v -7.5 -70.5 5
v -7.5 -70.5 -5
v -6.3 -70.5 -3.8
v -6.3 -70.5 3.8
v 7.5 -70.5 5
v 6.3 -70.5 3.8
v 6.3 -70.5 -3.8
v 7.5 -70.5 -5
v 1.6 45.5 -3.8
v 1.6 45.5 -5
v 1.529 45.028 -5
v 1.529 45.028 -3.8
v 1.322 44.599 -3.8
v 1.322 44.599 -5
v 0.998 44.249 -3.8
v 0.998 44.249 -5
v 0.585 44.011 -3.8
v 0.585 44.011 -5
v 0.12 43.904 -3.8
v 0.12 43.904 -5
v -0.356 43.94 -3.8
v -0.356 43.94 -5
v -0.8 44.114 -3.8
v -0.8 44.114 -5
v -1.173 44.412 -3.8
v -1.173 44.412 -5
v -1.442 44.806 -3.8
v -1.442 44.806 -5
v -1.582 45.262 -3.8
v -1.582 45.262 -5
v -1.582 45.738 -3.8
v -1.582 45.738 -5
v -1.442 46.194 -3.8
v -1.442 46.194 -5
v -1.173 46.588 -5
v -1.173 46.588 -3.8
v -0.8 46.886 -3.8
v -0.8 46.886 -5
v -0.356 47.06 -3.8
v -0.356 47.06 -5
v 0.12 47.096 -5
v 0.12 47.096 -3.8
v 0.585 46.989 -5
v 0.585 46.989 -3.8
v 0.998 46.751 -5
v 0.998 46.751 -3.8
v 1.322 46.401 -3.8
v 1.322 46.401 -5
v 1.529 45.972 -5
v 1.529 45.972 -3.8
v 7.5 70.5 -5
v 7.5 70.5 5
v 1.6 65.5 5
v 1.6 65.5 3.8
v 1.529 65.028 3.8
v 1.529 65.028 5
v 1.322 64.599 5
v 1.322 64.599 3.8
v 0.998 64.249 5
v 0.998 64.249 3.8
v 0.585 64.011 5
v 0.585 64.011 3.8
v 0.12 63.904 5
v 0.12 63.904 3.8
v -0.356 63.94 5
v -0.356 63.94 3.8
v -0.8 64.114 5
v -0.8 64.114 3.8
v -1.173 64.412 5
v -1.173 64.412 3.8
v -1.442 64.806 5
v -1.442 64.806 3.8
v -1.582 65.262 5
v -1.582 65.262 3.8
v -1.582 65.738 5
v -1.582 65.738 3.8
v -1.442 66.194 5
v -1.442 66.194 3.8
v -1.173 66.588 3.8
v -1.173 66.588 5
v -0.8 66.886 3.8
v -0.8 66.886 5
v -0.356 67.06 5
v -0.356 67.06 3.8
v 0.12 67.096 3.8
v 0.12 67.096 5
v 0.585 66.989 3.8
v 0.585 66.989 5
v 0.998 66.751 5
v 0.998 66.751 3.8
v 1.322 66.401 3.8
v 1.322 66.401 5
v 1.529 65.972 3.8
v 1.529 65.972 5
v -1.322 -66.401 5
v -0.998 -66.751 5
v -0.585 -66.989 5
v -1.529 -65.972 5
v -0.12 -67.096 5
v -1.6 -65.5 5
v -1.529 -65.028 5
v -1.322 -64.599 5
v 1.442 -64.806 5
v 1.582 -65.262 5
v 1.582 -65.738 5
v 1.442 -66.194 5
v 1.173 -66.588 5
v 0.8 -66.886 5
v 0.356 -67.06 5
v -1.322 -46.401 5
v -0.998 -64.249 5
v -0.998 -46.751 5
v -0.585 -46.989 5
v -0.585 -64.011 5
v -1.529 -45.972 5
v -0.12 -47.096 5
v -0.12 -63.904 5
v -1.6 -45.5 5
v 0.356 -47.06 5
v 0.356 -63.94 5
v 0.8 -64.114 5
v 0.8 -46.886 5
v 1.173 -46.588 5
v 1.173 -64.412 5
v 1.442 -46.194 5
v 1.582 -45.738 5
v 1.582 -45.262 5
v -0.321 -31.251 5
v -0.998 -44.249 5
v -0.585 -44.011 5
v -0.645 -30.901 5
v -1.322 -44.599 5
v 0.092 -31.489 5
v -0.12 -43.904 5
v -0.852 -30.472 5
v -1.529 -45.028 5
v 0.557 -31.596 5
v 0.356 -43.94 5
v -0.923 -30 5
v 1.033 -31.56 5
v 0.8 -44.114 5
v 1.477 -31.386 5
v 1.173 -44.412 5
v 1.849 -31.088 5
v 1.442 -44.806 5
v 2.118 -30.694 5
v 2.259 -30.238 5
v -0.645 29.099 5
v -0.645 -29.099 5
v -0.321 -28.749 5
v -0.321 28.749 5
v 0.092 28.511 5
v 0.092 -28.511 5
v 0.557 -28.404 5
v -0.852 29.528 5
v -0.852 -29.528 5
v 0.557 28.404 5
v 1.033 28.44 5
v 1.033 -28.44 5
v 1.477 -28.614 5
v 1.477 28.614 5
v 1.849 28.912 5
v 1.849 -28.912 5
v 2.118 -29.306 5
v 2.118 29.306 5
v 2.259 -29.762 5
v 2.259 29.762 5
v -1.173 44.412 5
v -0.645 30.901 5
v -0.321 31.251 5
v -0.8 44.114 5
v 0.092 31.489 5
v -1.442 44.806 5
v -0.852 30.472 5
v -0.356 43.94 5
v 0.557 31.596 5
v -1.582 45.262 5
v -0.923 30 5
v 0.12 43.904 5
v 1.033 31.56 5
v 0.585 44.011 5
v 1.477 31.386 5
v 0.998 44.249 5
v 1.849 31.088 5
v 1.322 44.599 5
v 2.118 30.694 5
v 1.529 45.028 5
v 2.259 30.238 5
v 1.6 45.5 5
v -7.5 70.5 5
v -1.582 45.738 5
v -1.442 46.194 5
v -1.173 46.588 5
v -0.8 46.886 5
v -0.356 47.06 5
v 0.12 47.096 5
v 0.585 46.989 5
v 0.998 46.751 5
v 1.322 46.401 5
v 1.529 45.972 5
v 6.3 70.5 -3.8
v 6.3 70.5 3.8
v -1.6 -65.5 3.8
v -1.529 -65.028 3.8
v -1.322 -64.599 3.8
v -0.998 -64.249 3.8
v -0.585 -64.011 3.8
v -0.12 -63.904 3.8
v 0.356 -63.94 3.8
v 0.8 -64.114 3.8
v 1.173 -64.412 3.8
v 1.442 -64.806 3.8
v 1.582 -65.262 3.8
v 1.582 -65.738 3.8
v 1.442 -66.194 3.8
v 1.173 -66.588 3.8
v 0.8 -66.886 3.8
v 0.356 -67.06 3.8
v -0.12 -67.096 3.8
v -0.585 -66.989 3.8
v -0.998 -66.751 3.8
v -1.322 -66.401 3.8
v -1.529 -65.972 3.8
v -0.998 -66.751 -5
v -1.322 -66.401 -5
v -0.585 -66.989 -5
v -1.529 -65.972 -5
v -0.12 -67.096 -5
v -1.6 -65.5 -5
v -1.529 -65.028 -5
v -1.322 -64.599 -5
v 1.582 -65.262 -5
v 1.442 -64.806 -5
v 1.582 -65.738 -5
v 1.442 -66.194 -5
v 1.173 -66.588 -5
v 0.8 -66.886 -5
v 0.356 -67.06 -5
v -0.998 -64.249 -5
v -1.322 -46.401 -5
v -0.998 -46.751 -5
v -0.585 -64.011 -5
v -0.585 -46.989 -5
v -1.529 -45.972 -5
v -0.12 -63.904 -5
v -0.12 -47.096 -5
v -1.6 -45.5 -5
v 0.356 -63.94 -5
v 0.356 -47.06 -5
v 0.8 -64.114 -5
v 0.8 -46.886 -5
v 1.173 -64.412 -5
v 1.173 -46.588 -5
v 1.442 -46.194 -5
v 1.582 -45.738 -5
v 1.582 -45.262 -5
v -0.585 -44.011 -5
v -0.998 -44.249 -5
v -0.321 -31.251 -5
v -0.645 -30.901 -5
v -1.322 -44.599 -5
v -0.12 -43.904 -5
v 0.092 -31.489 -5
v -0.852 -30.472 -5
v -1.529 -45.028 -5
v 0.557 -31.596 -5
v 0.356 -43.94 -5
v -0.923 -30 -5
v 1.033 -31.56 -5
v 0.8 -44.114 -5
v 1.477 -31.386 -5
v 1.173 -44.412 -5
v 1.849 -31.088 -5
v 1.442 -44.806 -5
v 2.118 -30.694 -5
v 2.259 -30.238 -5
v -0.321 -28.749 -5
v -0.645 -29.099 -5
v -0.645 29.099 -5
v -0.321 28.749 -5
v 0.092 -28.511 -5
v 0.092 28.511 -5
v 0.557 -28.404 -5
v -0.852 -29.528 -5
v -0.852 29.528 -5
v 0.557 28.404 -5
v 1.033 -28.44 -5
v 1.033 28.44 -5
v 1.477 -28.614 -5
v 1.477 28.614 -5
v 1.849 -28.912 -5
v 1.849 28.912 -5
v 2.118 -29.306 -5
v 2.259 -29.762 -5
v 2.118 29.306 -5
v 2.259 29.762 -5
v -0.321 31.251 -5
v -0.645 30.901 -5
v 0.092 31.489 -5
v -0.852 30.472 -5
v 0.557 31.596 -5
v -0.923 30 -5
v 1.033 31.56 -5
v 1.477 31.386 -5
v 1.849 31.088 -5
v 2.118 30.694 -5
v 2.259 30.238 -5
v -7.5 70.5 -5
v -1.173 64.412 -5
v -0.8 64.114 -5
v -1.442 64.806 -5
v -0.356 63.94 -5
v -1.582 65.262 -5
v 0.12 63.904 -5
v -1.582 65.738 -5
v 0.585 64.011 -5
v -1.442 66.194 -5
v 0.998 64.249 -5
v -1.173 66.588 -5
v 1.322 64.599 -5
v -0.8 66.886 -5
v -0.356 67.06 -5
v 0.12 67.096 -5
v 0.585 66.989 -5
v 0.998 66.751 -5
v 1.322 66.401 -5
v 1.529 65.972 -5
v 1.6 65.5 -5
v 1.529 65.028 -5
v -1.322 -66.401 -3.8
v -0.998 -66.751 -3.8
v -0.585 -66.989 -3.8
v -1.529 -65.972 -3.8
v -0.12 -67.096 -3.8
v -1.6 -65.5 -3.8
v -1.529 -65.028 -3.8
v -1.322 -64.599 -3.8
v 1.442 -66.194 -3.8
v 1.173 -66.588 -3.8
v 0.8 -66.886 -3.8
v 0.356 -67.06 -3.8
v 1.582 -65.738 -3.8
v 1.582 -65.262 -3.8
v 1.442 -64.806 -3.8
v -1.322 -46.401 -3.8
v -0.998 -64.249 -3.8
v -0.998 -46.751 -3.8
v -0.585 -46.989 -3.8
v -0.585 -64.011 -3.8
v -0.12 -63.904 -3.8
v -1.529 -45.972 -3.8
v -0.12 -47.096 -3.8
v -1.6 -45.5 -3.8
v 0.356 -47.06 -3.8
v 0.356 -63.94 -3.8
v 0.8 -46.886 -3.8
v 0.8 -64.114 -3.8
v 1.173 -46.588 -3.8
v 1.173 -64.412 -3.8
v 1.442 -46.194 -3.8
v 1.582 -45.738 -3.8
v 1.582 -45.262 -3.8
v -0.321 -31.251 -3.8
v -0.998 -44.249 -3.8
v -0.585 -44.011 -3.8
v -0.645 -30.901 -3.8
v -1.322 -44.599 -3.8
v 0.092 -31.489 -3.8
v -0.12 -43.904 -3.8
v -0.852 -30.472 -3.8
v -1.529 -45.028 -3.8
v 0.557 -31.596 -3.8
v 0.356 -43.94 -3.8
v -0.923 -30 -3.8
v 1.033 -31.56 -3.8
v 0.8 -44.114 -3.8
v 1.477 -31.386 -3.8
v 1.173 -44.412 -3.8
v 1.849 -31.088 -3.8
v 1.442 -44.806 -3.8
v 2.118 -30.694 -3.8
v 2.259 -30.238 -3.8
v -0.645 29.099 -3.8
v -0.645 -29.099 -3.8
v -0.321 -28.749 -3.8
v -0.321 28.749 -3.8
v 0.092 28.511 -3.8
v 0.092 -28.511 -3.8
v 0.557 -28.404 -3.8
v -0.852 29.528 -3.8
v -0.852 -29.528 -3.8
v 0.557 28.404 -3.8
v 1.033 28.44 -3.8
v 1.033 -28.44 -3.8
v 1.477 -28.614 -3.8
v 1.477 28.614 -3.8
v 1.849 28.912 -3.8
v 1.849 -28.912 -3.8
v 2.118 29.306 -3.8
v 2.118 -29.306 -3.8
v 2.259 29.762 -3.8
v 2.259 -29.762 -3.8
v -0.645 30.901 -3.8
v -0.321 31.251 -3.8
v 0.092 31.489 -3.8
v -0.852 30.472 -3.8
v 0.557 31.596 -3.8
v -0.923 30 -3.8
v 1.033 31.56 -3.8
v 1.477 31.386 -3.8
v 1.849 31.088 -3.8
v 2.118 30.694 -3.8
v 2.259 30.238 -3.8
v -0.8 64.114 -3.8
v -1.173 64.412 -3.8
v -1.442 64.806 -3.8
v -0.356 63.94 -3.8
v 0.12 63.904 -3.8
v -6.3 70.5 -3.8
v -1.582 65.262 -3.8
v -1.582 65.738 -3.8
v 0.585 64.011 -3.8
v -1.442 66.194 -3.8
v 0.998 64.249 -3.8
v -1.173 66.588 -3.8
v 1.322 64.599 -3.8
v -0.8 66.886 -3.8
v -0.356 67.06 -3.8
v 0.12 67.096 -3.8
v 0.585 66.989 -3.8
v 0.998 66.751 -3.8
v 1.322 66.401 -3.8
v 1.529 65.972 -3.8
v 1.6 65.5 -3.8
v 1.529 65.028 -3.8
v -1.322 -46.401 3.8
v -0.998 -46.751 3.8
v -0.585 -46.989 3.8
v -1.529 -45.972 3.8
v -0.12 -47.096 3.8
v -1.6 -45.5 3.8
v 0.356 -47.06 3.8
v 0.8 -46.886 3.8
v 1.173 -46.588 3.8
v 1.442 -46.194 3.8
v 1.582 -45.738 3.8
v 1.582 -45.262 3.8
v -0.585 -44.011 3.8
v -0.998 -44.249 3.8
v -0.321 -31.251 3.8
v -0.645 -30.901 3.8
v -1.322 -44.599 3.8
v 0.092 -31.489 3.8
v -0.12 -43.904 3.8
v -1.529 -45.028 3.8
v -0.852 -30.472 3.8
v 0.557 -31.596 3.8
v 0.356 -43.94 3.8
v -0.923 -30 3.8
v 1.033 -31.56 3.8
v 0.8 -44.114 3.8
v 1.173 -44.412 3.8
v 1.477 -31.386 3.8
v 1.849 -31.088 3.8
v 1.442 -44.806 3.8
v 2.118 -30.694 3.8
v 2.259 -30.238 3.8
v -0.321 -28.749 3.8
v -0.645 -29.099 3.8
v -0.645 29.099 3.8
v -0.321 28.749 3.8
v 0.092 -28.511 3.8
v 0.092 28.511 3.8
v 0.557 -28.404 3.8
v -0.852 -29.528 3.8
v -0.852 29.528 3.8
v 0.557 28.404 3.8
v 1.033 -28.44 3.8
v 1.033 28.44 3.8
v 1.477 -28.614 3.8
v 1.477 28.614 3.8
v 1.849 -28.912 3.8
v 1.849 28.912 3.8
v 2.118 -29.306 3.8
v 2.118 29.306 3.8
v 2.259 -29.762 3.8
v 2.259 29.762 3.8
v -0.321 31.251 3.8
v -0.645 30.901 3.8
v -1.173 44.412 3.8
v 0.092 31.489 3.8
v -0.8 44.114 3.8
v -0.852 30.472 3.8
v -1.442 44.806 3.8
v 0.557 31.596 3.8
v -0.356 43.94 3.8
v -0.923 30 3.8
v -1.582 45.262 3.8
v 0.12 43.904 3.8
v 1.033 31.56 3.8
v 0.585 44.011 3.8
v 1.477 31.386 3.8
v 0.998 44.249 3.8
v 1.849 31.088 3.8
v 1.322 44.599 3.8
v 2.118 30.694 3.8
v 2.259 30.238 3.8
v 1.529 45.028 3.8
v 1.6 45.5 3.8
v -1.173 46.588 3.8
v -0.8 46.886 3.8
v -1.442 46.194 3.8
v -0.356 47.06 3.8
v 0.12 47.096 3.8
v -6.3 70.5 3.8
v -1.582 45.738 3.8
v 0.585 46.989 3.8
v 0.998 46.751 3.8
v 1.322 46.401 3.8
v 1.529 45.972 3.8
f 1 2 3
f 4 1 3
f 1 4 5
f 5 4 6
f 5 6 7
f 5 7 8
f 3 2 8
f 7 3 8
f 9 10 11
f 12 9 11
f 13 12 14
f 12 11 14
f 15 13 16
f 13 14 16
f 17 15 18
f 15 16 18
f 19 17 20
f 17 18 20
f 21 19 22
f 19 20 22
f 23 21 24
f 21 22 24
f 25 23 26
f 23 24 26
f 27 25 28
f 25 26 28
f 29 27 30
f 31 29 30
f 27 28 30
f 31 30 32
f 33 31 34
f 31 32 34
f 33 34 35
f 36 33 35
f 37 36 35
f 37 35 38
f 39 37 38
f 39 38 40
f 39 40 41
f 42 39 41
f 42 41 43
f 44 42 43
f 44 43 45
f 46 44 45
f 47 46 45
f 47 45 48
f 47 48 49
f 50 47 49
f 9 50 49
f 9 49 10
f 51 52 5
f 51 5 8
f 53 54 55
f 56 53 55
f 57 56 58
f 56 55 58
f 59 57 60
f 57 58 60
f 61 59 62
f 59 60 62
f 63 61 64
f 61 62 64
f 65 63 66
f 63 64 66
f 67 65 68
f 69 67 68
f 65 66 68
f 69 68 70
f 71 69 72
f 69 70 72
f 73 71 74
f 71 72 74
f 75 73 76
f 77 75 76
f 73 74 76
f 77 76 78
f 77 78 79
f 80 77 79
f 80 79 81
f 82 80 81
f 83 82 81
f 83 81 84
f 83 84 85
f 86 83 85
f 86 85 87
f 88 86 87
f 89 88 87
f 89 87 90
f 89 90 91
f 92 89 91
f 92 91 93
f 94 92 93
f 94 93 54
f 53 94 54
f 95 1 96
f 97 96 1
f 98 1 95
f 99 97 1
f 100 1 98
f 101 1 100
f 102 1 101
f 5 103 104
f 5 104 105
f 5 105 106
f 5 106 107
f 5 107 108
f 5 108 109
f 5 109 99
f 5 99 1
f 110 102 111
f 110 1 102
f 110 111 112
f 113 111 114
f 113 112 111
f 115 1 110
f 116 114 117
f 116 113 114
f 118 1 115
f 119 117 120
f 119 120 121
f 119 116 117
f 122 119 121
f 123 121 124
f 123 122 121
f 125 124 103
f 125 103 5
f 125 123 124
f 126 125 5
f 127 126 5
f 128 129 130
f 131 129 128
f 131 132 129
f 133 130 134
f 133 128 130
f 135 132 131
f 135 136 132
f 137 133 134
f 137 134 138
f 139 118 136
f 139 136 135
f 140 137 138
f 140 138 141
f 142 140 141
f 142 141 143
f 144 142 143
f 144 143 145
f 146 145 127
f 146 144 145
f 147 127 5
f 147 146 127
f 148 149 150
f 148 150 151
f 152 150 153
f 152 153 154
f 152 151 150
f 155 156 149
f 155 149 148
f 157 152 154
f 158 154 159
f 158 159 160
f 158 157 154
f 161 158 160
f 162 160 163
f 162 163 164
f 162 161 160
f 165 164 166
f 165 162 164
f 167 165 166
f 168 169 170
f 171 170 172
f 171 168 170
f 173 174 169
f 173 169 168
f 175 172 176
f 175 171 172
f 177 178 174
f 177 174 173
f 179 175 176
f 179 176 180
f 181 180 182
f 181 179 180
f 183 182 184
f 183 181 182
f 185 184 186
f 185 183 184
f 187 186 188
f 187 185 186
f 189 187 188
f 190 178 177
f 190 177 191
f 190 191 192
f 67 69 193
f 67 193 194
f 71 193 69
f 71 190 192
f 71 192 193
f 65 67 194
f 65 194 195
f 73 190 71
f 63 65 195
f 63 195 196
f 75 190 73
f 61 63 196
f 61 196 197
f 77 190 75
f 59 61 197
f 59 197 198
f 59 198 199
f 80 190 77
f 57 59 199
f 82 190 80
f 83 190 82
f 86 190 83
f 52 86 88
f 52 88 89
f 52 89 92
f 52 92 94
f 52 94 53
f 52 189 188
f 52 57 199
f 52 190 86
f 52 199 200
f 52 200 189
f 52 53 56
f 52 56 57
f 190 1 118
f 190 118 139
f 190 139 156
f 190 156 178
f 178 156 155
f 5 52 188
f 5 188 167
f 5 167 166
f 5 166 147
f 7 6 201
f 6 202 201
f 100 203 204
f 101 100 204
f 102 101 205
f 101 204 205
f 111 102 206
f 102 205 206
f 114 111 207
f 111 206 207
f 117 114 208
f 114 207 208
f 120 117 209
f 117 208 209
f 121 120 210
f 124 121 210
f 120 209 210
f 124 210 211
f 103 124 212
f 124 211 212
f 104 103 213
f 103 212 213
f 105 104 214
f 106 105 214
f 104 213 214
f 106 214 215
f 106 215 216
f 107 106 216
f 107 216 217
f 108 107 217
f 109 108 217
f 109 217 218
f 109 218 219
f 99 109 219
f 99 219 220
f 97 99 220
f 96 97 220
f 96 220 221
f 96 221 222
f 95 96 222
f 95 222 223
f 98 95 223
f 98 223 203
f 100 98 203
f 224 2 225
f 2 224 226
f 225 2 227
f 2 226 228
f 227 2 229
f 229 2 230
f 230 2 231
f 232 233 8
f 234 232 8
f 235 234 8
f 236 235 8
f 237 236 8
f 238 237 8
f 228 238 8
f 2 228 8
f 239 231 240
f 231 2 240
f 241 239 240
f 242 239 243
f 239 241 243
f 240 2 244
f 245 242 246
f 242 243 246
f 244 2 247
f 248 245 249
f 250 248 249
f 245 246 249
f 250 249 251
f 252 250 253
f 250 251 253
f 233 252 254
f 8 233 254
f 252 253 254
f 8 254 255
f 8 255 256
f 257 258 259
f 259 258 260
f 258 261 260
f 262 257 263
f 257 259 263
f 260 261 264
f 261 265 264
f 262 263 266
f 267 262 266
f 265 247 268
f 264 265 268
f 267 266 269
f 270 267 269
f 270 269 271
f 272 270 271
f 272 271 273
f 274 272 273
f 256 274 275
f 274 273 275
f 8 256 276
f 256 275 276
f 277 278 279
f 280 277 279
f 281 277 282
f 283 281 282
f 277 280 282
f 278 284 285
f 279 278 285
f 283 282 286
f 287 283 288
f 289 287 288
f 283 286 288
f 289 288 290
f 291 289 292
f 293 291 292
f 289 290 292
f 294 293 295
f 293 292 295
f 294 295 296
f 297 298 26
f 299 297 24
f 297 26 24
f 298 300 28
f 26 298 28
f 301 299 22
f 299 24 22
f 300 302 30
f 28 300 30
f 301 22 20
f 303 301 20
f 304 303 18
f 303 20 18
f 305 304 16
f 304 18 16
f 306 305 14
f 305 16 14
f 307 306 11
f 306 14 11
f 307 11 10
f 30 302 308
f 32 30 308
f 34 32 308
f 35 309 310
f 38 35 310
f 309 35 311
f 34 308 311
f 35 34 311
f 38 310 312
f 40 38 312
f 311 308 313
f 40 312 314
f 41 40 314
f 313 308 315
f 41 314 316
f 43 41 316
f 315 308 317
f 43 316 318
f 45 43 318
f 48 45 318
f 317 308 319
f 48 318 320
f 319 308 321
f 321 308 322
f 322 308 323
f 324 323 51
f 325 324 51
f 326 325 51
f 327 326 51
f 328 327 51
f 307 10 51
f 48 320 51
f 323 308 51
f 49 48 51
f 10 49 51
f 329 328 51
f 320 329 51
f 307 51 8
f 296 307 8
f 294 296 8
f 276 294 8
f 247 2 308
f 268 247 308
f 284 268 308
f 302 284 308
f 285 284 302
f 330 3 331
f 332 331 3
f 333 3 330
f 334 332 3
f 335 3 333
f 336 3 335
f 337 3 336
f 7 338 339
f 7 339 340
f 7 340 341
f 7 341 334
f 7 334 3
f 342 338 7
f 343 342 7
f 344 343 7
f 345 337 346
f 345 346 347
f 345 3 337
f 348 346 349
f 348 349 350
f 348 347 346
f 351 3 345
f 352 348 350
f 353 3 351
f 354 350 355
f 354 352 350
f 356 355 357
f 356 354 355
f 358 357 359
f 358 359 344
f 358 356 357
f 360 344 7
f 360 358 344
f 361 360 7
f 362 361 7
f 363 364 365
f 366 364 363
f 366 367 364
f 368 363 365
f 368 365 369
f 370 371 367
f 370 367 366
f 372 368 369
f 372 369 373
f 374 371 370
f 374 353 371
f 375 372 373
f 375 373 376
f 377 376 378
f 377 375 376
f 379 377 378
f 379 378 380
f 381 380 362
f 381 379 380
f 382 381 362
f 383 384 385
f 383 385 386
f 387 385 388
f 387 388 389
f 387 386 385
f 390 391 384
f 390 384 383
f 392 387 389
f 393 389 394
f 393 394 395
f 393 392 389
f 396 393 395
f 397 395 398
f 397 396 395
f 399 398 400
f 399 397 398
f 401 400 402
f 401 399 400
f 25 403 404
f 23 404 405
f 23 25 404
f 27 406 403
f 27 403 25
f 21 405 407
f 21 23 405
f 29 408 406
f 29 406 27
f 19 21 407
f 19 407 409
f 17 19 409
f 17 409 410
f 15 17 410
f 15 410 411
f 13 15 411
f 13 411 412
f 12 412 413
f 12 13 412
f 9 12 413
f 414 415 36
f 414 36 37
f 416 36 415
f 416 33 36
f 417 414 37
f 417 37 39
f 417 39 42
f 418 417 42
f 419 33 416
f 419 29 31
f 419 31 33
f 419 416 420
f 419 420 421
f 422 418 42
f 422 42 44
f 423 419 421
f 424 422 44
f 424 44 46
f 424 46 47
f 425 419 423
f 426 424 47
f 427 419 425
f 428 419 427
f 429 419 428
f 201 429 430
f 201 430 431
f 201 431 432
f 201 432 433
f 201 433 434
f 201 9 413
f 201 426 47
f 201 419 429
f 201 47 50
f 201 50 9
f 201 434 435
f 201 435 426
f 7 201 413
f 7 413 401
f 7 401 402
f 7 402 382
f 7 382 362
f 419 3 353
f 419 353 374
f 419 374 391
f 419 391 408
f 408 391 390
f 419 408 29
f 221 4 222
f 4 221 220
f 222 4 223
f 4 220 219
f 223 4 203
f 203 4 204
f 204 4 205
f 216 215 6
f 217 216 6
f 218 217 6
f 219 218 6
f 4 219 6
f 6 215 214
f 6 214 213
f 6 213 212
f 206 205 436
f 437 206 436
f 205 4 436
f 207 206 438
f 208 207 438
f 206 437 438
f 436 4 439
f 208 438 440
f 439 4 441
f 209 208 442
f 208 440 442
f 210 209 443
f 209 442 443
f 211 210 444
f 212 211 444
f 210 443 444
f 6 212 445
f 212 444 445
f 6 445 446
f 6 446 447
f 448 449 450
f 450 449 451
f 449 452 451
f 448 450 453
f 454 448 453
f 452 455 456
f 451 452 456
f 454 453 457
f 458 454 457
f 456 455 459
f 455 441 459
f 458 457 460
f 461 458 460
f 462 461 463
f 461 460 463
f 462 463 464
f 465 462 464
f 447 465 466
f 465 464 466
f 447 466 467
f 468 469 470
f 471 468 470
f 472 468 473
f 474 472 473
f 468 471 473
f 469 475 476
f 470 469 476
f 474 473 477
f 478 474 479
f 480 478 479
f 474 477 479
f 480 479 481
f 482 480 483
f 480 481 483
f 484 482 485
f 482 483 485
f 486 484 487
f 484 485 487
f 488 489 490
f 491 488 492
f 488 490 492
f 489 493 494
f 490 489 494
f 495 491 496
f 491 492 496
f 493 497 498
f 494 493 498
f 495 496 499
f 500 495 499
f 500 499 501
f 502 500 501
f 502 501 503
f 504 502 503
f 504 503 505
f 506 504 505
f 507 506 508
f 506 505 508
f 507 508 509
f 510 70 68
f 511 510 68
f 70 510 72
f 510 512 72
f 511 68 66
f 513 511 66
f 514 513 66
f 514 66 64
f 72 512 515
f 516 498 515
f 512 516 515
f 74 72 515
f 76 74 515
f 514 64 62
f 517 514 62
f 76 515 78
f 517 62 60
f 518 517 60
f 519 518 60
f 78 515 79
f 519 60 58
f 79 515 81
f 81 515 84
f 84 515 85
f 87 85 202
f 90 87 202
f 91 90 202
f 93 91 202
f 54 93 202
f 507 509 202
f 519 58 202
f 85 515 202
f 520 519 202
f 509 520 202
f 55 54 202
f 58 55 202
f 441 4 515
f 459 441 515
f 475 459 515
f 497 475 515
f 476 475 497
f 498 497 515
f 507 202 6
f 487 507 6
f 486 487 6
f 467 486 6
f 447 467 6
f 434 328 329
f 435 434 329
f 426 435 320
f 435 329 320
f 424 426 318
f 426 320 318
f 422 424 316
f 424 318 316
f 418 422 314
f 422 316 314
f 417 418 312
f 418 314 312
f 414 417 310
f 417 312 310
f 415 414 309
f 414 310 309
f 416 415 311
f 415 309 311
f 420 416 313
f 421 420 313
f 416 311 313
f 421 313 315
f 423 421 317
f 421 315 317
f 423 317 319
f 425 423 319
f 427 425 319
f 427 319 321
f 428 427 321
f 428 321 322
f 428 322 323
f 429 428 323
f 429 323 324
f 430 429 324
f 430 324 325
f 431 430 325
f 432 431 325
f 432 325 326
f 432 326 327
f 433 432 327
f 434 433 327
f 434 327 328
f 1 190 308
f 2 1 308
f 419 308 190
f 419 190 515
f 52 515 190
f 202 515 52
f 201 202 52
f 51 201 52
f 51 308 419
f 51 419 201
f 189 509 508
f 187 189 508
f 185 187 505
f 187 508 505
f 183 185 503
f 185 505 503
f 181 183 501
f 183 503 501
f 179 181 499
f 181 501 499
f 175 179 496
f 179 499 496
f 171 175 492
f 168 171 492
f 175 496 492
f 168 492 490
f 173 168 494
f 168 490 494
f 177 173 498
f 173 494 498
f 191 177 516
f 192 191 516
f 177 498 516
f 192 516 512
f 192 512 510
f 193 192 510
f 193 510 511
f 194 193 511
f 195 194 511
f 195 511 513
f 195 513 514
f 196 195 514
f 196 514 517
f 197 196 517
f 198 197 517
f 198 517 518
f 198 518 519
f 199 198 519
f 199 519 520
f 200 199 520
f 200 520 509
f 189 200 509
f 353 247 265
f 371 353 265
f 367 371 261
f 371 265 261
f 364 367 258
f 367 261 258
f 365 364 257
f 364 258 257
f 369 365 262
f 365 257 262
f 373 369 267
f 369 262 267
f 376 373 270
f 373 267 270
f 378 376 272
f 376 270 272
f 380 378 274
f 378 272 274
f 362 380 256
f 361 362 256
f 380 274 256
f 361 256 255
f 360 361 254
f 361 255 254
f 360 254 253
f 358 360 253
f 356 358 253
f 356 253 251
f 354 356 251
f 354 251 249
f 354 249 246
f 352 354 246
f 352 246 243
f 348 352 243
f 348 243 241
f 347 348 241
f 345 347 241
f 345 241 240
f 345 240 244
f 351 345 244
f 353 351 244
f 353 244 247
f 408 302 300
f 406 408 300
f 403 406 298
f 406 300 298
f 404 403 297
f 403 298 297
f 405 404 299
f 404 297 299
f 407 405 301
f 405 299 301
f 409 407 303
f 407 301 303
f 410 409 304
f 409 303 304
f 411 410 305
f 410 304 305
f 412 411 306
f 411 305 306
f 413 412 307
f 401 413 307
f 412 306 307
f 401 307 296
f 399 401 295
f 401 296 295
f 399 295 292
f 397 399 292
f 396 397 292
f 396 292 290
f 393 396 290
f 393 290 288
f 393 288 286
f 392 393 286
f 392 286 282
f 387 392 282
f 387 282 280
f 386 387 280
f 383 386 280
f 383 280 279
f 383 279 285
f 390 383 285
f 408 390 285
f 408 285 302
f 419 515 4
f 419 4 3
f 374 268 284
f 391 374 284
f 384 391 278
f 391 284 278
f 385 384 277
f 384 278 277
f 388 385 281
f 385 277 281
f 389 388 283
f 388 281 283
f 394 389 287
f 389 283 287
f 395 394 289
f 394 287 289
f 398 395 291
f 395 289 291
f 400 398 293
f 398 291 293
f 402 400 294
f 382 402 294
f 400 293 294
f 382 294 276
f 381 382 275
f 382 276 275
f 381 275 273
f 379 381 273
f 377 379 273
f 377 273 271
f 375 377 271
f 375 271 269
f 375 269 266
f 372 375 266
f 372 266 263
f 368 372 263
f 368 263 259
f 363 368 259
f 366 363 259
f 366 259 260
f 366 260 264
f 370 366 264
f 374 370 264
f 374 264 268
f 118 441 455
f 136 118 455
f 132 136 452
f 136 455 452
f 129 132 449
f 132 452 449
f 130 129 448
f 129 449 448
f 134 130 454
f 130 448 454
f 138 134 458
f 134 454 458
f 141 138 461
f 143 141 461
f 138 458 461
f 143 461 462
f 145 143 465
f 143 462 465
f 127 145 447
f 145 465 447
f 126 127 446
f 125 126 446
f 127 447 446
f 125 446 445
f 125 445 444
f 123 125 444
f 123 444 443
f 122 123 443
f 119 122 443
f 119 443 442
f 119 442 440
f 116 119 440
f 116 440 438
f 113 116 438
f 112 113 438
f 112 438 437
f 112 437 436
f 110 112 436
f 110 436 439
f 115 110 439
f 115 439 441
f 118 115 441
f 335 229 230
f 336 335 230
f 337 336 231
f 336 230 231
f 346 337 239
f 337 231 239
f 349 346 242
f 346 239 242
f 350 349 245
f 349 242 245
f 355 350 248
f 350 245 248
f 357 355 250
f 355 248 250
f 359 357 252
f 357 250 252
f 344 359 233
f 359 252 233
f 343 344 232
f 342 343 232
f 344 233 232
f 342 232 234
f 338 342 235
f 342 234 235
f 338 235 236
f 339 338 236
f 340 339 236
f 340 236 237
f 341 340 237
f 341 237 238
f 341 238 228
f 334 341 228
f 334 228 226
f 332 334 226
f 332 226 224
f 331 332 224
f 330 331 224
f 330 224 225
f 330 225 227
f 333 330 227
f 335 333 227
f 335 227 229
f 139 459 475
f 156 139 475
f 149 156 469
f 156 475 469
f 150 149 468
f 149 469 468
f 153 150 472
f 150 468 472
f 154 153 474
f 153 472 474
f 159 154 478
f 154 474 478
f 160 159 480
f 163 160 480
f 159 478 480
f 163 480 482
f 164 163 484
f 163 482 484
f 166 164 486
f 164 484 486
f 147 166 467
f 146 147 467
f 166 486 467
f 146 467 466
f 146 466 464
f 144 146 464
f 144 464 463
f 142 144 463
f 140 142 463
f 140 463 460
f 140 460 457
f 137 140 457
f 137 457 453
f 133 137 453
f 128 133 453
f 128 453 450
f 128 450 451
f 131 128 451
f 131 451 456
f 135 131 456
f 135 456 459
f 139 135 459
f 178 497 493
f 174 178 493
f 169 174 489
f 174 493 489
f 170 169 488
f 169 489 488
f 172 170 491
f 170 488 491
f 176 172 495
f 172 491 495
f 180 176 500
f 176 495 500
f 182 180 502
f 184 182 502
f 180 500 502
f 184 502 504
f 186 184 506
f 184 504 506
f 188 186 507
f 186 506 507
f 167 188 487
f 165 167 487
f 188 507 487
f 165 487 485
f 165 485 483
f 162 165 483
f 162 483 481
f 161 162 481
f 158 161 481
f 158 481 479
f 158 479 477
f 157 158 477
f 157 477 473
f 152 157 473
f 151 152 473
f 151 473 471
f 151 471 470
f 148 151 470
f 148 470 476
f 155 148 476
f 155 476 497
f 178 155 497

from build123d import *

# Parameters (mm, degrees)
SKETCH_1_W          = 15
SKETCH_1_H          = 10
SKETCH_1_W_2        = 12.6
SKETCH_1_H_2        = 7.6
EXTRUDE_1_DEPTH     = 70.5
SKETCH_2_R          = 1.6
CUT_EXTRUDE_1_DEPTH = 100
SKETCH_3_R          = 1.6
CUT_EXTRUDE_2_DEPTH = 10


with BuildPart() as part:
    # ｽｹｯﾁ1 → ﾎﾞｽ - 押し出し1 (new, symmetric)
    with BuildSketch(Plane(origin=(0, 0, 0), x_dir=(1, 0, 0), z_dir=(0, 1, 0))):
        Rectangle(SKETCH_1_W, SKETCH_1_H)
        Rectangle(SKETCH_1_W_2, SKETCH_1_H_2, mode=Mode.SUBTRACT)
    extrude(amount=EXTRUDE_1_DEPTH, both=True)

    # ｽｹｯﾁ2 → ｶｯﾄ - 押し出し1 (cut)
    with BuildSketch(Plane(origin=(0, 0, -5), x_dir=(-1, 0, 0), z_dir=(0, 0, -1))):
        with Locations((0, -65.5)):
            Circle(SKETCH_2_R)
        with Locations((0, -45.5)):
            Circle(SKETCH_2_R)
        with Locations(Location((0, 45.5, 0), (0, 0, 180))):
            Circle(SKETCH_2_R)
        with Locations(Location((0, 65.5, 0), (0, 0, 180))):
            Circle(SKETCH_2_R)
    extrude(amount=-CUT_EXTRUDE_1_DEPTH, mode=Mode.SUBTRACT)

    # ｽｹｯﾁ3 → ｶｯﾄ - 押し出し2 (cut)
    with BuildSketch(Plane(origin=(0, 0, -5), x_dir=(-1, 0, 0), z_dir=(0, 0, -1))):
        with Locations((-0.676513704, -30)):
            Circle(SKETCH_3_R)
        with Locations((-0.676513704, 30)):
            Circle(SKETCH_3_R)
    extrude(amount=-CUT_EXTRUDE_2_DEPTH, mode=Mode.SUBTRACT)


solid = part.part
